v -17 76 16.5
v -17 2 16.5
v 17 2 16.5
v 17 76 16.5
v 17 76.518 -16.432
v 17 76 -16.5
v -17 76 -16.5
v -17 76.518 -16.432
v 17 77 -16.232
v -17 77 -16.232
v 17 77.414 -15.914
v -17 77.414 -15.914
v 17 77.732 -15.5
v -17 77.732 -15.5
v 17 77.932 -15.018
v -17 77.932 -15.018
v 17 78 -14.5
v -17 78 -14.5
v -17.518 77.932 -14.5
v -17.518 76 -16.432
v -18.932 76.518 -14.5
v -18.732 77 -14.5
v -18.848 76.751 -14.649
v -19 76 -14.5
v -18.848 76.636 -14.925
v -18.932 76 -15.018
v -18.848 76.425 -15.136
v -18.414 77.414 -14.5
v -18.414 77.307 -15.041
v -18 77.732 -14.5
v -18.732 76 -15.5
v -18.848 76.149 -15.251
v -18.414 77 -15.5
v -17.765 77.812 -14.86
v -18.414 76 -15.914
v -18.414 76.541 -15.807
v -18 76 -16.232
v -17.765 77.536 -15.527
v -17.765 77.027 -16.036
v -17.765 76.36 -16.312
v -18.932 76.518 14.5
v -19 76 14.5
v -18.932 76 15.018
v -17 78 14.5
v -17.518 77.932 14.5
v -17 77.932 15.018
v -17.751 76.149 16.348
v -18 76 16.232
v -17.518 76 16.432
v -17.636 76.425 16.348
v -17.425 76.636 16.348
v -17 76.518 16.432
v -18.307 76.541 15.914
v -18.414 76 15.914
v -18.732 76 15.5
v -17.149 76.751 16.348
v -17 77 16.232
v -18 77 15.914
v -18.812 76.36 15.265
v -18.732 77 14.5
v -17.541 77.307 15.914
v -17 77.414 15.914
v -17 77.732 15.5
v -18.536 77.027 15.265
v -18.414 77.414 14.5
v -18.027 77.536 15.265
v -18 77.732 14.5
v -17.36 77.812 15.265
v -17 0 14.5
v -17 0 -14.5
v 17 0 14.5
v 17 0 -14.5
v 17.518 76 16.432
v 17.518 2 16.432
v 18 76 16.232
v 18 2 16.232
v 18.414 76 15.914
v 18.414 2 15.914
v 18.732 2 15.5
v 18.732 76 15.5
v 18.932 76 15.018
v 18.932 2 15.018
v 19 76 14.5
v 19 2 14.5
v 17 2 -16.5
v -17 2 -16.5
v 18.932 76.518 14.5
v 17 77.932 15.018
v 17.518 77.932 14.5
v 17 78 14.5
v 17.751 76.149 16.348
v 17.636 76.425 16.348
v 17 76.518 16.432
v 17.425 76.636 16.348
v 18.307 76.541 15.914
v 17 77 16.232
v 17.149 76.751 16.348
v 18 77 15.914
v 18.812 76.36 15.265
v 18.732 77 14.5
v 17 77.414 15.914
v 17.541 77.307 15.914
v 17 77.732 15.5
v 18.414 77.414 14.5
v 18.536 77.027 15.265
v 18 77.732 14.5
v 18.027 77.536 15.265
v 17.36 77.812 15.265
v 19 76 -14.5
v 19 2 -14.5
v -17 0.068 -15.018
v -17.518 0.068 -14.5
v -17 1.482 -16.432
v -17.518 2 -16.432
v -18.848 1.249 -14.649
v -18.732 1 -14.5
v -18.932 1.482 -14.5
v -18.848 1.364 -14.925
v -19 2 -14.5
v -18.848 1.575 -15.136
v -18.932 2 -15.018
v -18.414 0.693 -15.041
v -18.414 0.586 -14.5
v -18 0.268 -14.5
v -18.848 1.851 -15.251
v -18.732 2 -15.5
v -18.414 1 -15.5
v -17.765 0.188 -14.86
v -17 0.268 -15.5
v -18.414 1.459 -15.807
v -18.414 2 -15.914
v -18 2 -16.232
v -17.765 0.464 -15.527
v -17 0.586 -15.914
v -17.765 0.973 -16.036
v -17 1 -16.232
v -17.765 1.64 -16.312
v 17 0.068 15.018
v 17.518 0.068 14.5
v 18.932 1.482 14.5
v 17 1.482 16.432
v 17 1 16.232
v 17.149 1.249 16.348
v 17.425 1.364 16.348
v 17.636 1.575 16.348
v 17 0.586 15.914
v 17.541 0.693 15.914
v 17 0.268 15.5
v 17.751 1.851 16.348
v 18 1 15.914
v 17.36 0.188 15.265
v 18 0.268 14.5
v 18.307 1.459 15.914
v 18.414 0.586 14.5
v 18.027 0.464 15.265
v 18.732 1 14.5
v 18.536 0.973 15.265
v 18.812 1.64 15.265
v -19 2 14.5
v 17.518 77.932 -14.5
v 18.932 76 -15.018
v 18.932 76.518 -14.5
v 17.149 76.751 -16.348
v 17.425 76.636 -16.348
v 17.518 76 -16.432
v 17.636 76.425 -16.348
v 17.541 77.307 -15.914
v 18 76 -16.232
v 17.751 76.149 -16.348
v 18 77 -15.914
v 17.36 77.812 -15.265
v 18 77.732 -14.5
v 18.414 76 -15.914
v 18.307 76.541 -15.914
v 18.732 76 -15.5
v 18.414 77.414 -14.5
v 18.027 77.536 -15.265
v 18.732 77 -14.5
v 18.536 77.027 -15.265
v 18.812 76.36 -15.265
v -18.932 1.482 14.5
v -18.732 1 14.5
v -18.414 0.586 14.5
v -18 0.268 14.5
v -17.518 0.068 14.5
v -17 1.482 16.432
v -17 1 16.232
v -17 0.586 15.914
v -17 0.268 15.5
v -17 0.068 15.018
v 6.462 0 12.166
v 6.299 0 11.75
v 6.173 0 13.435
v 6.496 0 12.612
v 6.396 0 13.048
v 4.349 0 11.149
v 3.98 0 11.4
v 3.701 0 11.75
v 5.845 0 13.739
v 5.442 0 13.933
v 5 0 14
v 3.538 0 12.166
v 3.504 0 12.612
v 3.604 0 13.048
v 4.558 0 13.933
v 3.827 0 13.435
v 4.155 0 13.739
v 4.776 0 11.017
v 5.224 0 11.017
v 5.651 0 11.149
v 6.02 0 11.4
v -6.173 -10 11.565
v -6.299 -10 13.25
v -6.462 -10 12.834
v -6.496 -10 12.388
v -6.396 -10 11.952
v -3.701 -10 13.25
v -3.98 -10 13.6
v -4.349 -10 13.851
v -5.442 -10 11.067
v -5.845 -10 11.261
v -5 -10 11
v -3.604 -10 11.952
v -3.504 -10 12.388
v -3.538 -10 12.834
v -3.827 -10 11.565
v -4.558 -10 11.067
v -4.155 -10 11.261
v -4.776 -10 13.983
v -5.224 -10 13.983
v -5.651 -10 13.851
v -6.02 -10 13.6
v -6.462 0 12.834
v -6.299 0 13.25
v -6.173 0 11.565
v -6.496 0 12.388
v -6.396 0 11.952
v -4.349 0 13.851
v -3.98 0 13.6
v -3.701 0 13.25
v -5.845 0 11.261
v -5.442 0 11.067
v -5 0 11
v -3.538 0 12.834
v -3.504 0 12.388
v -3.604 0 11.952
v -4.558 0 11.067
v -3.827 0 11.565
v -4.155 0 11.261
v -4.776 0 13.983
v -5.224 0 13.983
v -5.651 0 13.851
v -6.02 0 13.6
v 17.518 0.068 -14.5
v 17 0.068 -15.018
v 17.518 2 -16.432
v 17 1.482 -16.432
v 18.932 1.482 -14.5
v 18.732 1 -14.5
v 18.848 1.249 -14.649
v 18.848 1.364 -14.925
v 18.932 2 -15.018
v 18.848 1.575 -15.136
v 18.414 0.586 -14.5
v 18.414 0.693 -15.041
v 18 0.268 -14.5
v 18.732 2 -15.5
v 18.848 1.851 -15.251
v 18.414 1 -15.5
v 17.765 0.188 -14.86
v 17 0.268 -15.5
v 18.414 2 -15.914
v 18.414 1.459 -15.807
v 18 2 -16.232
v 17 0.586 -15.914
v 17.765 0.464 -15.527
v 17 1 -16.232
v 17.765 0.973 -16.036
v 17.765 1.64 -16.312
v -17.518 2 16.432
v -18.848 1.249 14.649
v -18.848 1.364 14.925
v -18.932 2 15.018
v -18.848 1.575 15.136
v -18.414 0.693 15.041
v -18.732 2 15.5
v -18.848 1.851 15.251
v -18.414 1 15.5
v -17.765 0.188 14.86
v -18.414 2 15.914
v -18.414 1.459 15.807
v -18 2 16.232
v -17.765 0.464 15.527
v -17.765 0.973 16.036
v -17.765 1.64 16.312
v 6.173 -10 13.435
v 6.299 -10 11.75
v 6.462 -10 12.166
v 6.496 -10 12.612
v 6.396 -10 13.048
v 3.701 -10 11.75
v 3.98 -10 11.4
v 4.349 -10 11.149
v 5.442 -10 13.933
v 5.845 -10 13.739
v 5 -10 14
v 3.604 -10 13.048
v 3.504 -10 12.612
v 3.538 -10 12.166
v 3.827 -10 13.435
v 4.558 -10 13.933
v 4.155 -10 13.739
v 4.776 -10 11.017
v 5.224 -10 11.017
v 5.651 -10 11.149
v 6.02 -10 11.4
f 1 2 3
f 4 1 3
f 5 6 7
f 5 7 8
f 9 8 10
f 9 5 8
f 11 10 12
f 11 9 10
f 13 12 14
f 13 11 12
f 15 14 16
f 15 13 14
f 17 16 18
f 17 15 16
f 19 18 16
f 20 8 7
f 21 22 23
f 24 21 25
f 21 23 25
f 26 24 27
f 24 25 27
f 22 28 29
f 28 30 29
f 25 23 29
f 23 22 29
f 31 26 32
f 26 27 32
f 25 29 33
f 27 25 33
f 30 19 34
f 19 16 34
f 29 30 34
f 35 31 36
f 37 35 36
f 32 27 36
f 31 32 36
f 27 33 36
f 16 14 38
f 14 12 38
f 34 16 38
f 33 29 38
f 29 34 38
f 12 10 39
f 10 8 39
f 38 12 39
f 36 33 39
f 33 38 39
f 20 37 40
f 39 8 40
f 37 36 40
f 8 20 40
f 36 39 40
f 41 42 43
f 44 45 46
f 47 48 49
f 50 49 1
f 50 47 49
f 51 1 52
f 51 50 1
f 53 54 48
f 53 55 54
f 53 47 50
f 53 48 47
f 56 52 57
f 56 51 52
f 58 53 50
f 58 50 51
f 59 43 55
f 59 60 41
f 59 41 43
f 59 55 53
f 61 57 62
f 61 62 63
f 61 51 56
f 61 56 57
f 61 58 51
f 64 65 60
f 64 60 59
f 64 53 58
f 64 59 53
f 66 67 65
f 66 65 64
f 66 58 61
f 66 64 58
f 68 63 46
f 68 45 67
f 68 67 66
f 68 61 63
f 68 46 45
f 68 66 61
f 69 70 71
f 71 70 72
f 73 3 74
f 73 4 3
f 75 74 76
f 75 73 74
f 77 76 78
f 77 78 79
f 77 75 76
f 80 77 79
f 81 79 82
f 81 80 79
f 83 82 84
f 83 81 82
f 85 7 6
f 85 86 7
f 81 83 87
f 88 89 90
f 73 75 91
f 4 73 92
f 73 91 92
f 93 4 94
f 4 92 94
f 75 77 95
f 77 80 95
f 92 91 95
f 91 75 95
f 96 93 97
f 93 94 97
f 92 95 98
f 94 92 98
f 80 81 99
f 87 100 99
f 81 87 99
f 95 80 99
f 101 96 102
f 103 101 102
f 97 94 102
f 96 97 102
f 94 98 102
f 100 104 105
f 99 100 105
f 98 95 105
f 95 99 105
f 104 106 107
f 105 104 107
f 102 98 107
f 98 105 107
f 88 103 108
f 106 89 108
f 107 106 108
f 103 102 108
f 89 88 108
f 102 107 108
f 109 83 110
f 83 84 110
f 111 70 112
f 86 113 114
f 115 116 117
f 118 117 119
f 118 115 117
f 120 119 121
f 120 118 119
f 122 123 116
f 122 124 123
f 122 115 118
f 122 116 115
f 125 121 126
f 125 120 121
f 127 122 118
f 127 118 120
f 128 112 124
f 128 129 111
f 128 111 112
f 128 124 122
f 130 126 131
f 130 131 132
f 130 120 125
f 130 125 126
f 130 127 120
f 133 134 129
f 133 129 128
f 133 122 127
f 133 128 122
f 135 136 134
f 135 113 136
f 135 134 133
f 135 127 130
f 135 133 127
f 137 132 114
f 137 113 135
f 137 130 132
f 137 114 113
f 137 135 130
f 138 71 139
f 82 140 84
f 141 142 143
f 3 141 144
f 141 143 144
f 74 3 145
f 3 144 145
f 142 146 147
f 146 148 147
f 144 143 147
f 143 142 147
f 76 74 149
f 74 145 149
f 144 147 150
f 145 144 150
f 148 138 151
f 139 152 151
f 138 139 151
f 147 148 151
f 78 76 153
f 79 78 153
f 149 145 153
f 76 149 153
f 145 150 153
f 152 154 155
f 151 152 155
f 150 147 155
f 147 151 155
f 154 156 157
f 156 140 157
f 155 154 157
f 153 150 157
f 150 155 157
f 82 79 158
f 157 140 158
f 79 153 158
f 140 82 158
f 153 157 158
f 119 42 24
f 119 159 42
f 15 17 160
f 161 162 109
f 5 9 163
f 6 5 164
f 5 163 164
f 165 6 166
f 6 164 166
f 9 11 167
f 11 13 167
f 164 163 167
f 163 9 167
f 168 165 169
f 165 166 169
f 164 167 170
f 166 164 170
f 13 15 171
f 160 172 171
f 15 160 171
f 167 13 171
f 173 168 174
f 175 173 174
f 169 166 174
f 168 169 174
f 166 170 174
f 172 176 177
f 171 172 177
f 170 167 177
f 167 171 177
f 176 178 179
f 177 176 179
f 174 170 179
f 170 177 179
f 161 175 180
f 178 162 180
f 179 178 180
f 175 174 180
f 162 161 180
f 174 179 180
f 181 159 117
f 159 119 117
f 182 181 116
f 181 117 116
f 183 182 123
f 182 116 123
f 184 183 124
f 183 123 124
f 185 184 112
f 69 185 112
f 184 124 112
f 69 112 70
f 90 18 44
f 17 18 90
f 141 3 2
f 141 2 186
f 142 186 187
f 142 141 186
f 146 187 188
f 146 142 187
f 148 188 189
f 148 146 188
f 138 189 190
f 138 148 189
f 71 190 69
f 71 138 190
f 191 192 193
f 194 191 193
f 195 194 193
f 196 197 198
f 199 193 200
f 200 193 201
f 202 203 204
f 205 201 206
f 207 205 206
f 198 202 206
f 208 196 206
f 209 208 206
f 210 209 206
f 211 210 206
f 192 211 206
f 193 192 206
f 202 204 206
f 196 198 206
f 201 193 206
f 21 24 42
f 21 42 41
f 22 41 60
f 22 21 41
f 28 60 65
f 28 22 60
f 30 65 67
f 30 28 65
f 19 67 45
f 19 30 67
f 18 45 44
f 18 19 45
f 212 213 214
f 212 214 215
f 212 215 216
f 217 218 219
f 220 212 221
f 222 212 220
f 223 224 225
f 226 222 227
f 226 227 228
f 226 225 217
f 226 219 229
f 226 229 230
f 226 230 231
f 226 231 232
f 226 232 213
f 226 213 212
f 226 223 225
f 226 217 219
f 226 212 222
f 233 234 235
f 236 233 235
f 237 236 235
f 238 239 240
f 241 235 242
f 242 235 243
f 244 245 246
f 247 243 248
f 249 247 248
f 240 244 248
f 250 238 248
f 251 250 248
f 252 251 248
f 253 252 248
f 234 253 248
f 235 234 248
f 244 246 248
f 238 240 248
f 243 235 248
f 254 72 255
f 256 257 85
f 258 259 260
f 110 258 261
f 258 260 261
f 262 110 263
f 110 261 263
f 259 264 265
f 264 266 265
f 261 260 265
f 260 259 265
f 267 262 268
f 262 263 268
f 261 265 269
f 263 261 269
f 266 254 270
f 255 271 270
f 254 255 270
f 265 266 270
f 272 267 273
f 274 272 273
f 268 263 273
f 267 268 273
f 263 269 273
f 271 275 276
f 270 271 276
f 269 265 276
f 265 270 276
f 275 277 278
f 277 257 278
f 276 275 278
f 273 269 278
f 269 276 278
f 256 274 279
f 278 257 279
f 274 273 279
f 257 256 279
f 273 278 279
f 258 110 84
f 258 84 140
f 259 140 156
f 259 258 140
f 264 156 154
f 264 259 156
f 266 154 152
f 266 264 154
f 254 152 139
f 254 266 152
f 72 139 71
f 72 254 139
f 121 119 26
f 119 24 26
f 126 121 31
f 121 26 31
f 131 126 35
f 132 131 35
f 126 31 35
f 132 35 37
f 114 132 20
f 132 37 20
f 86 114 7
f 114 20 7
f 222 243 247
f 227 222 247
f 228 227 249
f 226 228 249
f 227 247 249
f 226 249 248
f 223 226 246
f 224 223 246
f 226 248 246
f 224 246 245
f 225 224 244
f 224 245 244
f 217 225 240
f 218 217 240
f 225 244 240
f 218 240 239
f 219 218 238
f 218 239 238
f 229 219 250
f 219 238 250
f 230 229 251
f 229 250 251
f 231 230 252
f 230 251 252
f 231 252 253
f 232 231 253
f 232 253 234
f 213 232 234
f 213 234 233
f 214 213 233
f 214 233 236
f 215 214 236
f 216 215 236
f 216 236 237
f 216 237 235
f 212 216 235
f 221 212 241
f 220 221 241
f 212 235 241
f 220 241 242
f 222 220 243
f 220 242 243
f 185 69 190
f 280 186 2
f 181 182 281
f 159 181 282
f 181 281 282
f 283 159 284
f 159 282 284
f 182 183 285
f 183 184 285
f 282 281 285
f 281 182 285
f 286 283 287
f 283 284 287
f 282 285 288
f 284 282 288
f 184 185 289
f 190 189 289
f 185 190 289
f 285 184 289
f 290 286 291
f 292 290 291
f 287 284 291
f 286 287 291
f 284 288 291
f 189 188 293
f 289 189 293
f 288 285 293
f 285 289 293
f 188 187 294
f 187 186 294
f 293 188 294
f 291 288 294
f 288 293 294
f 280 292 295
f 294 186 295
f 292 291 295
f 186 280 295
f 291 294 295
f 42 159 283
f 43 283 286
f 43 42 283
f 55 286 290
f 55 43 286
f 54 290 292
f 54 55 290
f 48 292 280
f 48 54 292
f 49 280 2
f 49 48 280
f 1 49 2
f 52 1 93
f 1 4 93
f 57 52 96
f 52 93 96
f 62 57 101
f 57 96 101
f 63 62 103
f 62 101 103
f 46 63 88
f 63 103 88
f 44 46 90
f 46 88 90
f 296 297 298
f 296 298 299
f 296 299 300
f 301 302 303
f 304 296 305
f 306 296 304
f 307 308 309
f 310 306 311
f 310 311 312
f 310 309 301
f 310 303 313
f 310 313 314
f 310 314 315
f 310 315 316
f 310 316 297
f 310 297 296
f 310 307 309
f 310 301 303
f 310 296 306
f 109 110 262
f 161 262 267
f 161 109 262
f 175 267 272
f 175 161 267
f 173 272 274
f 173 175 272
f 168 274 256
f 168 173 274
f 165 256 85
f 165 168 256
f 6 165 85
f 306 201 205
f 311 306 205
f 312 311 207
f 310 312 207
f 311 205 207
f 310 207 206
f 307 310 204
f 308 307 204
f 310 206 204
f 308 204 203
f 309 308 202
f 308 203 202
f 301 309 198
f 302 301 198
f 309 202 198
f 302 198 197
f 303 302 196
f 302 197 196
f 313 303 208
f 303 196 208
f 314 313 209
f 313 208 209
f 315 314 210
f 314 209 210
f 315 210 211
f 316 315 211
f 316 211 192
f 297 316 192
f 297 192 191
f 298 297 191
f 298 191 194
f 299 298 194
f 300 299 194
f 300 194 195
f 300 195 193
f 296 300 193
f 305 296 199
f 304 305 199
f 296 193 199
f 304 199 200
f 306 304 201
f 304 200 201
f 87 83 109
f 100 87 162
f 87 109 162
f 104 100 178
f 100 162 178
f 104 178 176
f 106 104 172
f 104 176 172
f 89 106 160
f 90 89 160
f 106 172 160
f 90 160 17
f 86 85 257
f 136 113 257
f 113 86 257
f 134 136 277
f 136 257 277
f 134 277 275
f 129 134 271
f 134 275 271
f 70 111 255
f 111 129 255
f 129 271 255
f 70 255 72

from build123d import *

# Parameters (mm, degrees)
SKETCH_1_W        = 38
SKETCH_1_H        = 33
EXTRUDE_1_DEPTH   = 78
FILLET_1_R        = 2
SKETCH_2_R        = 1.5
EXTRUDE_2_DEPTH   = 10
EXTRUDE_2_2_DEPTH = 10


with BuildPart() as part:
    # 草图1 → 凸台-拉伸1 (new body)
    with BuildSketch(Plane(origin=(0, 0, 0), x_dir=(1, 0, 0), z_dir=(0, 1, 0))):
        Rectangle(SKETCH_1_W, SKETCH_1_H)
    extrude(amount=EXTRUDE_1_DEPTH)

    # 圆角1
    fillet_1_edges = [part.edges().sort_by_distance(p)[0] for p in [
        (19, 78, 0),
        (0, 78, -16.5),
        (-19, 78, 0),
        (0, 0, -16.5),
        (19, 0, 0),
        (0, 0, 16.5),
        (-19, 0, 0),
        (-19, 39, -16.5),
        (19, 39, -16.5),
        (19, 39, 16.5),
        (-19, 39, 16.5),
        (0, 78, 16.5),
    ]]
    fillet(fillet_1_edges, radius=FILLET_1_R)


with BuildPart() as body_2:
    # 草图2 → 凸台-拉伸2 (new body)
    with BuildSketch(Plane.XZ):
        with Locations(Location((-5, 12.5, 0), (0, 0, 270))):
            Circle(SKETCH_2_R)
    extrude(amount=EXTRUDE_2_DEPTH)


with BuildPart() as body_3:
    # 草图2 → Extrude 2 2 (new body)
    with BuildSketch(Plane.XZ):
        with Locations(Location((5, 12.5, 0), (0, 0, 90))):
            Circle(SKETCH_2_R)
    extrude(amount=EXTRUDE_2_2_DEPTH)


solid = Compound([part.part, body_2.part, body_3.part])
